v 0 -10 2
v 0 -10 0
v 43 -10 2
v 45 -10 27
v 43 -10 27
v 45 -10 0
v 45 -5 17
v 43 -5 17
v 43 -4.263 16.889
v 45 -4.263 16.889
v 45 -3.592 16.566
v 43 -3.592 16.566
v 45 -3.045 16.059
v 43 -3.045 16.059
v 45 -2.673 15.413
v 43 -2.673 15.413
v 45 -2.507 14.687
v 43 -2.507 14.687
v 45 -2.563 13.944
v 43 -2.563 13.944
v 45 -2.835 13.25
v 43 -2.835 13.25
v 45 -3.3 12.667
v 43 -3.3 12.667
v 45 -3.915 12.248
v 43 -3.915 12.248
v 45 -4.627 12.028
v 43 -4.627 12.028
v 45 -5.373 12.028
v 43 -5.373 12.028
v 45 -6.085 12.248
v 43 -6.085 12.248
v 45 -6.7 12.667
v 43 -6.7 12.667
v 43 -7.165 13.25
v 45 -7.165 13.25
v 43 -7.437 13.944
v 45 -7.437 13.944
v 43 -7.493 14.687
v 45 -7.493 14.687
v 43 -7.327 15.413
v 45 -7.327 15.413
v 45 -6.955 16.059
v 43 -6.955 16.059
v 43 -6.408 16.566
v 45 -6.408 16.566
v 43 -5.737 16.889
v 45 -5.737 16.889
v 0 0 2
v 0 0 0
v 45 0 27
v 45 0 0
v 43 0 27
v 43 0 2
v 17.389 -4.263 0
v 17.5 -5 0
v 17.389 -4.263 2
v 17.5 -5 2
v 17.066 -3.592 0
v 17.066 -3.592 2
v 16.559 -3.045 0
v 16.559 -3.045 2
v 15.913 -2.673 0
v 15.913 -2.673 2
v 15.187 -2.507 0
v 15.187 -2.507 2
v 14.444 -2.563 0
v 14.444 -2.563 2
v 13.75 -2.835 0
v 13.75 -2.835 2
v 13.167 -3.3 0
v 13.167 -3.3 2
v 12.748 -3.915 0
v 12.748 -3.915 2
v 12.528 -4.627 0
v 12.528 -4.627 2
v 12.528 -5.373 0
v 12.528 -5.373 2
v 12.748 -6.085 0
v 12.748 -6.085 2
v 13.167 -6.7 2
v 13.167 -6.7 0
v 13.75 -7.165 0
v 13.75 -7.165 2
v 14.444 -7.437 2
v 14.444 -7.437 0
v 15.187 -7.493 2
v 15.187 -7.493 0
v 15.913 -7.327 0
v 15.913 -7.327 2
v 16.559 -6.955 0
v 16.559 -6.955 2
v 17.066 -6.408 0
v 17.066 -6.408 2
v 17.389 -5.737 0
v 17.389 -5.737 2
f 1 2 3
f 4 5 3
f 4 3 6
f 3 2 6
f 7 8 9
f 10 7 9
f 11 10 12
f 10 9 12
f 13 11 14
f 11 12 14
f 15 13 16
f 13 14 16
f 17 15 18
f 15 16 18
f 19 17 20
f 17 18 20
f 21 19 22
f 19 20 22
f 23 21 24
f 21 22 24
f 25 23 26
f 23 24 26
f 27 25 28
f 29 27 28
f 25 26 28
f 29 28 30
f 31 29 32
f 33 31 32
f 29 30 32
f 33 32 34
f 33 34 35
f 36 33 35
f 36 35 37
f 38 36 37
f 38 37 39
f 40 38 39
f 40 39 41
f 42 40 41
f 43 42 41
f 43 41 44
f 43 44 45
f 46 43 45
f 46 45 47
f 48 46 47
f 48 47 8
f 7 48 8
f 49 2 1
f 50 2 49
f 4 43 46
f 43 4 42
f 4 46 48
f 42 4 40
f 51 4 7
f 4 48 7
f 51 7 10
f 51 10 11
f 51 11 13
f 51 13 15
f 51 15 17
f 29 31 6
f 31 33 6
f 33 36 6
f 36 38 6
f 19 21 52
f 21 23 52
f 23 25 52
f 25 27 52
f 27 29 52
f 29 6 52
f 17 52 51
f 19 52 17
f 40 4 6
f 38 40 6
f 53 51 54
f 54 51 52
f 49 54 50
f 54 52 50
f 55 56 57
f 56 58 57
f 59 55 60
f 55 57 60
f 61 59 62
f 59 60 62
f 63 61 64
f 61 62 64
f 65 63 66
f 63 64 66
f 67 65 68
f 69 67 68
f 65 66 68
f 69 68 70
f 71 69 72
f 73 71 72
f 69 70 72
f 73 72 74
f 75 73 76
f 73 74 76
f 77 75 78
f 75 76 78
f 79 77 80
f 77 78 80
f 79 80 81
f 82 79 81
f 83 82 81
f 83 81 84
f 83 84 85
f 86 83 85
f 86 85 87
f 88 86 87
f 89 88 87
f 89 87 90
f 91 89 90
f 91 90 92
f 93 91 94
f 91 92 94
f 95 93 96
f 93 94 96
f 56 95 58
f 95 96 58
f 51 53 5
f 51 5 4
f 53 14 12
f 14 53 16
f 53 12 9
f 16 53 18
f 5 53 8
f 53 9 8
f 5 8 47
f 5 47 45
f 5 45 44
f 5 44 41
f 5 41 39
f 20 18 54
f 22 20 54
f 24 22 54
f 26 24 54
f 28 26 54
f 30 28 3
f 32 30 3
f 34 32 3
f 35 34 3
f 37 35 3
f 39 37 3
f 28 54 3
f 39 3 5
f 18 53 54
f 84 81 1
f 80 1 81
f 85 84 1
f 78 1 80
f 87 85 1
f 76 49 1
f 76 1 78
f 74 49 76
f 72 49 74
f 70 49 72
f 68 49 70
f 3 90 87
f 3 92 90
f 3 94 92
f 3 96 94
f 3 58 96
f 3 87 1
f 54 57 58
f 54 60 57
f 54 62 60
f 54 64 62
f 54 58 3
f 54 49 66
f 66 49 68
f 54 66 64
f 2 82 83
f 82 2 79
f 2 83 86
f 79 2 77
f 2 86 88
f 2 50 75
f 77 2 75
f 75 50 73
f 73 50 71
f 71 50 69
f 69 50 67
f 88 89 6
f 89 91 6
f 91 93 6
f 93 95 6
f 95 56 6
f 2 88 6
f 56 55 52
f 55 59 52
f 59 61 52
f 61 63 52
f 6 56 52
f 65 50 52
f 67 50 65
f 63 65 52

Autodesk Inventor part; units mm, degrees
ref_plane "YZ Plane" through (0, 0, 0) normal (1, 0, 0) x (0, 1, 0)
ref_plane "XZ Plane" through (0, 0, 0) normal (0, 1, 0) x (-1, 0, 0)
ref_plane "XY Plane" through (0, 0, 0) normal (0, 0, 1) x (1, 0, 0)
sketch "Sketch1" plane through (0, 0, 0) normal (0, 0, 1) x (1, 0, 0)
  line L0 (0, 0) -> (45, 0)
  line L1 (45, 0) -> (45, -10)
  line L2 (45, -10) -> (0, -10)
  line L3 (0, -10) -> (0, 0)
  line L4 (45, 0) -> (48.2934, 0)
  line L5 (48.2934, 0) -> (48.2934, -10)
  line L6 (48.2934, -10) -> (45, -10)
  line L7 (45, -10) -> (45, 0)
extrude "Extrusion1" add sketch "Sketch1" along normal blind 2 contours L0 L1 L2 L3
sketch "Sketch2" plane through (0, 0, 2) normal (0, 0, 1) x (1, 0, 0)
  line L0 (0, 0) -> (0, -5)
  circle A0 centre (15, -5) radius 2.5
extrude "Extrusion2" cut sketch "Sketch2" against normal blind 2
sketch "Sketch3" plane through (0, 0, 2) normal (0, 0, 1) x (1, 0, 0)
  line L0 (45, -10) -> (45, 0) projected
  line L1 (45, 0) -> (43, 0)
  line L2 (45, 0) -> (0, 0) projected
  line L3 (43, 0) -> (43, -10)
  line L4 (0, -10) -> (45, -10) projected
  line L5 (43, -10) -> (45, -10)
  line L6 (45, -10) -> (45, 0)
  dimension "d10" = 2
extrude "Extrusion3" add sketch "Sketch3" along normal blind 25
sketch "Sketch4" plane through (43, -10, 2) normal (-1, 0, 0) x (0, 0, 1)
  line L0 (25, 0) -> (25, 10) projected
  circle A0 centre (12.5, 5) radius 2.5
  point P0 (-2, 10)
extrude "Extrusion4" cut sketch "Sketch4" against normal blind 25
properties part number "slider_link" material "Stainless Steel AISI 440C, Welded"
